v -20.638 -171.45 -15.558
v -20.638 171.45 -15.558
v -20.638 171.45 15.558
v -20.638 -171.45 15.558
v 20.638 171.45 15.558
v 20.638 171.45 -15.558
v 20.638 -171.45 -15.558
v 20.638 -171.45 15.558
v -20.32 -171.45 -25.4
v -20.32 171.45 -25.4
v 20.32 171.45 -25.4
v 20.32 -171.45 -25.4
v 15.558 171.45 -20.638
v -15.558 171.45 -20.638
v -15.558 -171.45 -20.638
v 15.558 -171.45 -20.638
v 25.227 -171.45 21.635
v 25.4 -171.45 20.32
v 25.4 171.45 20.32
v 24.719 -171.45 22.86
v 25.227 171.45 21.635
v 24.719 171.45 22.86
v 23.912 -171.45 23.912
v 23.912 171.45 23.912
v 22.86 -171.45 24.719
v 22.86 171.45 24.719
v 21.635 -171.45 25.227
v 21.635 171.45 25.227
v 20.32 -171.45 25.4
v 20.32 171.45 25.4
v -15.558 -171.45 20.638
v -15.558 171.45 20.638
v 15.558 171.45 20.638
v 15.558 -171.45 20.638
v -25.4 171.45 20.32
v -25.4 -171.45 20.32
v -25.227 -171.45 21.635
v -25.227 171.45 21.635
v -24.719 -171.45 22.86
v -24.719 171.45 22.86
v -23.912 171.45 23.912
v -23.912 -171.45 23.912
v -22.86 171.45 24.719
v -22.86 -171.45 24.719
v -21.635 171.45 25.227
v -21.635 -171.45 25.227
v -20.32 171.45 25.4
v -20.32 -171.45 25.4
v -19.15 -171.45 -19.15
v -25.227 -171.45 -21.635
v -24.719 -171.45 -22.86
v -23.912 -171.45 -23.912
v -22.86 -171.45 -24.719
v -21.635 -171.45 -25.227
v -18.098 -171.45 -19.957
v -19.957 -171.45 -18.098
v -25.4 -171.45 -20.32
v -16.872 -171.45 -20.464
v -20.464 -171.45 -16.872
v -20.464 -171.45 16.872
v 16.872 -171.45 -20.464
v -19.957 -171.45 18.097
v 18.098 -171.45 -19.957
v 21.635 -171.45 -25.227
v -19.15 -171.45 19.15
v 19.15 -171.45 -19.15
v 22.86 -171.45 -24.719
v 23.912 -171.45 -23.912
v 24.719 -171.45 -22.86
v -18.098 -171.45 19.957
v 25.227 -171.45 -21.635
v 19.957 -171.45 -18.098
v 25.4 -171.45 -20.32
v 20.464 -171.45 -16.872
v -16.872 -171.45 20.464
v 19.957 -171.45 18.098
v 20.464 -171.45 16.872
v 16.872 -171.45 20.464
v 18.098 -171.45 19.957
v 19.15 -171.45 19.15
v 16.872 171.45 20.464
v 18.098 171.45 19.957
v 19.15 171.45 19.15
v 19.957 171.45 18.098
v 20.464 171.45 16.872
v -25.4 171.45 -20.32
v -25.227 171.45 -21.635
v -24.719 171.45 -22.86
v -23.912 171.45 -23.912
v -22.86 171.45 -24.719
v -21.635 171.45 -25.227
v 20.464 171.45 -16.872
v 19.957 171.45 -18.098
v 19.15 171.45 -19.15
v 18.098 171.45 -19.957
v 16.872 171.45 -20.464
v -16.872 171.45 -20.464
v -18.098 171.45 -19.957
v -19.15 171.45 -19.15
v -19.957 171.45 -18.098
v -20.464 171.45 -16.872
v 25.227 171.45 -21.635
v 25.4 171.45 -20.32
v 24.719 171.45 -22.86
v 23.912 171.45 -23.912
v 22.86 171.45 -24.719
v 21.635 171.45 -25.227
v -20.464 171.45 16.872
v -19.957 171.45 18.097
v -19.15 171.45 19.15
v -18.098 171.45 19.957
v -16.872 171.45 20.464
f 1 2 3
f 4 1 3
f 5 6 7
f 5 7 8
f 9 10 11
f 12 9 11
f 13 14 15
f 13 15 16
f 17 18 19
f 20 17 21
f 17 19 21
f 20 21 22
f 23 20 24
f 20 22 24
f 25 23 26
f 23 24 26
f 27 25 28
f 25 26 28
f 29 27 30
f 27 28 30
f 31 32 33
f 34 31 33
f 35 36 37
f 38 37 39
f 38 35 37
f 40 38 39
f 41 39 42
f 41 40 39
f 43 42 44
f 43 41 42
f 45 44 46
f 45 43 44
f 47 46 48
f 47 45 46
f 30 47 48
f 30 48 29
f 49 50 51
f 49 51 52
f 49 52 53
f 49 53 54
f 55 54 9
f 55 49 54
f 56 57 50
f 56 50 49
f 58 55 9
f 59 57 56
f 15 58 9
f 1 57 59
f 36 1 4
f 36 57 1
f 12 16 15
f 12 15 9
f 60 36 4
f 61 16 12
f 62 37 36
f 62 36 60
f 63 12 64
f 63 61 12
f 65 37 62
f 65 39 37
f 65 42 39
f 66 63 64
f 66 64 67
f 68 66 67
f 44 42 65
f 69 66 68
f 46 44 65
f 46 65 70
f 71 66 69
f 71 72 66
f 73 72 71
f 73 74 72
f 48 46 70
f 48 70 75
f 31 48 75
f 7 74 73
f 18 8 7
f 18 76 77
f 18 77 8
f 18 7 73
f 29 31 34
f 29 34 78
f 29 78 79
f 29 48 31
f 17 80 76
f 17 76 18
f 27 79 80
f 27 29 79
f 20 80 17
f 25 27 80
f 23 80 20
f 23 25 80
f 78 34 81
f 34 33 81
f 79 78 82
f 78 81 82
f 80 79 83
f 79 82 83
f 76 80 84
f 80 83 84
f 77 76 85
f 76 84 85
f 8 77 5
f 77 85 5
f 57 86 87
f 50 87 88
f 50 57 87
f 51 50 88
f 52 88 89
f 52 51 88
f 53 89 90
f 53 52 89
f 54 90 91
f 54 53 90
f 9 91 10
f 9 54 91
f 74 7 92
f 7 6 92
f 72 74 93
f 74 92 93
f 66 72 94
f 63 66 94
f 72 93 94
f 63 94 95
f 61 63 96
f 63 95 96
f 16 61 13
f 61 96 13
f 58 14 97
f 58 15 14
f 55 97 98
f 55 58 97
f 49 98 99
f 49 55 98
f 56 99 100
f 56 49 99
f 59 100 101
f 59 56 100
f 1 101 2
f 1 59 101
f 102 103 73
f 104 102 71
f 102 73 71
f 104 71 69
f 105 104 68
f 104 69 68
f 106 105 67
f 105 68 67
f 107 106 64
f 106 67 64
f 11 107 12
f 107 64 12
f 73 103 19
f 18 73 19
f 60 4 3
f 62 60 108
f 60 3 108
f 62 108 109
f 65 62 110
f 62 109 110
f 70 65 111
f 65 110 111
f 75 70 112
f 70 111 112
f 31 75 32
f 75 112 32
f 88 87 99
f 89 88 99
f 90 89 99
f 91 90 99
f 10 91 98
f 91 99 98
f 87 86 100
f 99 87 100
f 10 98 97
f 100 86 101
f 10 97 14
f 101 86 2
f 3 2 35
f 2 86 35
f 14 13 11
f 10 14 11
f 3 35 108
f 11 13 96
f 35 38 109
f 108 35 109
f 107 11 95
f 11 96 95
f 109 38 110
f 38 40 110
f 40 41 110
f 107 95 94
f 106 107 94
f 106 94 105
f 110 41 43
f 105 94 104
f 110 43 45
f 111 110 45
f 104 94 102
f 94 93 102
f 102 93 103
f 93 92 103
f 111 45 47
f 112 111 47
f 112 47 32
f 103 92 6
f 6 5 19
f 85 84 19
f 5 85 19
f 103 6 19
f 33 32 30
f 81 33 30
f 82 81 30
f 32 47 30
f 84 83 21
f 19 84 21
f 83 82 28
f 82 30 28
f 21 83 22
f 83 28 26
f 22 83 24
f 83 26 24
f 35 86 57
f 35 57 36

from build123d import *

# Parameters (mm, degrees)
F0_W     = 50.8
F0_H     = 50.8
F0_W_2   = 41.275
F0_H_2   = 41.275
F1_DEPTH = 171.45
F2_R     = 5.08
F3_R     = 5.08


with BuildPart() as f1:
    # F0 (on Front) → F1 (new body, symmetric)
    with BuildSketch(Plane.XZ):
        Rectangle(F0_W, F0_H)
        Rectangle(F0_W_2, F0_H_2, mode=Mode.SUBTRACT)
    extrude(amount=F1_DEPTH, both=True)

    # F2
    f2_edges = [f1.edges().sort_by_distance(p)[0] for p in [
        (-20.6375, 0, 20.6375),
        (-25.4, 0, -25.4),
        (25.4, 0, -25.4),
        (20.6375, 0, 20.6375),
        (25.4, 0, 25.4),
        (-25.4, 0, 25.4),
    ]]
    fillet(f2_edges, radius=F2_R)

    # F3
    f3_edges = [f1.edges().sort_by_distance(p)[0] for p in [
        (-20.6375, 0, -20.6375),
        (20.6375, 0, -20.6375),
    ]]
    fillet(f3_edges, radius=F3_R)


solid = f1.part
